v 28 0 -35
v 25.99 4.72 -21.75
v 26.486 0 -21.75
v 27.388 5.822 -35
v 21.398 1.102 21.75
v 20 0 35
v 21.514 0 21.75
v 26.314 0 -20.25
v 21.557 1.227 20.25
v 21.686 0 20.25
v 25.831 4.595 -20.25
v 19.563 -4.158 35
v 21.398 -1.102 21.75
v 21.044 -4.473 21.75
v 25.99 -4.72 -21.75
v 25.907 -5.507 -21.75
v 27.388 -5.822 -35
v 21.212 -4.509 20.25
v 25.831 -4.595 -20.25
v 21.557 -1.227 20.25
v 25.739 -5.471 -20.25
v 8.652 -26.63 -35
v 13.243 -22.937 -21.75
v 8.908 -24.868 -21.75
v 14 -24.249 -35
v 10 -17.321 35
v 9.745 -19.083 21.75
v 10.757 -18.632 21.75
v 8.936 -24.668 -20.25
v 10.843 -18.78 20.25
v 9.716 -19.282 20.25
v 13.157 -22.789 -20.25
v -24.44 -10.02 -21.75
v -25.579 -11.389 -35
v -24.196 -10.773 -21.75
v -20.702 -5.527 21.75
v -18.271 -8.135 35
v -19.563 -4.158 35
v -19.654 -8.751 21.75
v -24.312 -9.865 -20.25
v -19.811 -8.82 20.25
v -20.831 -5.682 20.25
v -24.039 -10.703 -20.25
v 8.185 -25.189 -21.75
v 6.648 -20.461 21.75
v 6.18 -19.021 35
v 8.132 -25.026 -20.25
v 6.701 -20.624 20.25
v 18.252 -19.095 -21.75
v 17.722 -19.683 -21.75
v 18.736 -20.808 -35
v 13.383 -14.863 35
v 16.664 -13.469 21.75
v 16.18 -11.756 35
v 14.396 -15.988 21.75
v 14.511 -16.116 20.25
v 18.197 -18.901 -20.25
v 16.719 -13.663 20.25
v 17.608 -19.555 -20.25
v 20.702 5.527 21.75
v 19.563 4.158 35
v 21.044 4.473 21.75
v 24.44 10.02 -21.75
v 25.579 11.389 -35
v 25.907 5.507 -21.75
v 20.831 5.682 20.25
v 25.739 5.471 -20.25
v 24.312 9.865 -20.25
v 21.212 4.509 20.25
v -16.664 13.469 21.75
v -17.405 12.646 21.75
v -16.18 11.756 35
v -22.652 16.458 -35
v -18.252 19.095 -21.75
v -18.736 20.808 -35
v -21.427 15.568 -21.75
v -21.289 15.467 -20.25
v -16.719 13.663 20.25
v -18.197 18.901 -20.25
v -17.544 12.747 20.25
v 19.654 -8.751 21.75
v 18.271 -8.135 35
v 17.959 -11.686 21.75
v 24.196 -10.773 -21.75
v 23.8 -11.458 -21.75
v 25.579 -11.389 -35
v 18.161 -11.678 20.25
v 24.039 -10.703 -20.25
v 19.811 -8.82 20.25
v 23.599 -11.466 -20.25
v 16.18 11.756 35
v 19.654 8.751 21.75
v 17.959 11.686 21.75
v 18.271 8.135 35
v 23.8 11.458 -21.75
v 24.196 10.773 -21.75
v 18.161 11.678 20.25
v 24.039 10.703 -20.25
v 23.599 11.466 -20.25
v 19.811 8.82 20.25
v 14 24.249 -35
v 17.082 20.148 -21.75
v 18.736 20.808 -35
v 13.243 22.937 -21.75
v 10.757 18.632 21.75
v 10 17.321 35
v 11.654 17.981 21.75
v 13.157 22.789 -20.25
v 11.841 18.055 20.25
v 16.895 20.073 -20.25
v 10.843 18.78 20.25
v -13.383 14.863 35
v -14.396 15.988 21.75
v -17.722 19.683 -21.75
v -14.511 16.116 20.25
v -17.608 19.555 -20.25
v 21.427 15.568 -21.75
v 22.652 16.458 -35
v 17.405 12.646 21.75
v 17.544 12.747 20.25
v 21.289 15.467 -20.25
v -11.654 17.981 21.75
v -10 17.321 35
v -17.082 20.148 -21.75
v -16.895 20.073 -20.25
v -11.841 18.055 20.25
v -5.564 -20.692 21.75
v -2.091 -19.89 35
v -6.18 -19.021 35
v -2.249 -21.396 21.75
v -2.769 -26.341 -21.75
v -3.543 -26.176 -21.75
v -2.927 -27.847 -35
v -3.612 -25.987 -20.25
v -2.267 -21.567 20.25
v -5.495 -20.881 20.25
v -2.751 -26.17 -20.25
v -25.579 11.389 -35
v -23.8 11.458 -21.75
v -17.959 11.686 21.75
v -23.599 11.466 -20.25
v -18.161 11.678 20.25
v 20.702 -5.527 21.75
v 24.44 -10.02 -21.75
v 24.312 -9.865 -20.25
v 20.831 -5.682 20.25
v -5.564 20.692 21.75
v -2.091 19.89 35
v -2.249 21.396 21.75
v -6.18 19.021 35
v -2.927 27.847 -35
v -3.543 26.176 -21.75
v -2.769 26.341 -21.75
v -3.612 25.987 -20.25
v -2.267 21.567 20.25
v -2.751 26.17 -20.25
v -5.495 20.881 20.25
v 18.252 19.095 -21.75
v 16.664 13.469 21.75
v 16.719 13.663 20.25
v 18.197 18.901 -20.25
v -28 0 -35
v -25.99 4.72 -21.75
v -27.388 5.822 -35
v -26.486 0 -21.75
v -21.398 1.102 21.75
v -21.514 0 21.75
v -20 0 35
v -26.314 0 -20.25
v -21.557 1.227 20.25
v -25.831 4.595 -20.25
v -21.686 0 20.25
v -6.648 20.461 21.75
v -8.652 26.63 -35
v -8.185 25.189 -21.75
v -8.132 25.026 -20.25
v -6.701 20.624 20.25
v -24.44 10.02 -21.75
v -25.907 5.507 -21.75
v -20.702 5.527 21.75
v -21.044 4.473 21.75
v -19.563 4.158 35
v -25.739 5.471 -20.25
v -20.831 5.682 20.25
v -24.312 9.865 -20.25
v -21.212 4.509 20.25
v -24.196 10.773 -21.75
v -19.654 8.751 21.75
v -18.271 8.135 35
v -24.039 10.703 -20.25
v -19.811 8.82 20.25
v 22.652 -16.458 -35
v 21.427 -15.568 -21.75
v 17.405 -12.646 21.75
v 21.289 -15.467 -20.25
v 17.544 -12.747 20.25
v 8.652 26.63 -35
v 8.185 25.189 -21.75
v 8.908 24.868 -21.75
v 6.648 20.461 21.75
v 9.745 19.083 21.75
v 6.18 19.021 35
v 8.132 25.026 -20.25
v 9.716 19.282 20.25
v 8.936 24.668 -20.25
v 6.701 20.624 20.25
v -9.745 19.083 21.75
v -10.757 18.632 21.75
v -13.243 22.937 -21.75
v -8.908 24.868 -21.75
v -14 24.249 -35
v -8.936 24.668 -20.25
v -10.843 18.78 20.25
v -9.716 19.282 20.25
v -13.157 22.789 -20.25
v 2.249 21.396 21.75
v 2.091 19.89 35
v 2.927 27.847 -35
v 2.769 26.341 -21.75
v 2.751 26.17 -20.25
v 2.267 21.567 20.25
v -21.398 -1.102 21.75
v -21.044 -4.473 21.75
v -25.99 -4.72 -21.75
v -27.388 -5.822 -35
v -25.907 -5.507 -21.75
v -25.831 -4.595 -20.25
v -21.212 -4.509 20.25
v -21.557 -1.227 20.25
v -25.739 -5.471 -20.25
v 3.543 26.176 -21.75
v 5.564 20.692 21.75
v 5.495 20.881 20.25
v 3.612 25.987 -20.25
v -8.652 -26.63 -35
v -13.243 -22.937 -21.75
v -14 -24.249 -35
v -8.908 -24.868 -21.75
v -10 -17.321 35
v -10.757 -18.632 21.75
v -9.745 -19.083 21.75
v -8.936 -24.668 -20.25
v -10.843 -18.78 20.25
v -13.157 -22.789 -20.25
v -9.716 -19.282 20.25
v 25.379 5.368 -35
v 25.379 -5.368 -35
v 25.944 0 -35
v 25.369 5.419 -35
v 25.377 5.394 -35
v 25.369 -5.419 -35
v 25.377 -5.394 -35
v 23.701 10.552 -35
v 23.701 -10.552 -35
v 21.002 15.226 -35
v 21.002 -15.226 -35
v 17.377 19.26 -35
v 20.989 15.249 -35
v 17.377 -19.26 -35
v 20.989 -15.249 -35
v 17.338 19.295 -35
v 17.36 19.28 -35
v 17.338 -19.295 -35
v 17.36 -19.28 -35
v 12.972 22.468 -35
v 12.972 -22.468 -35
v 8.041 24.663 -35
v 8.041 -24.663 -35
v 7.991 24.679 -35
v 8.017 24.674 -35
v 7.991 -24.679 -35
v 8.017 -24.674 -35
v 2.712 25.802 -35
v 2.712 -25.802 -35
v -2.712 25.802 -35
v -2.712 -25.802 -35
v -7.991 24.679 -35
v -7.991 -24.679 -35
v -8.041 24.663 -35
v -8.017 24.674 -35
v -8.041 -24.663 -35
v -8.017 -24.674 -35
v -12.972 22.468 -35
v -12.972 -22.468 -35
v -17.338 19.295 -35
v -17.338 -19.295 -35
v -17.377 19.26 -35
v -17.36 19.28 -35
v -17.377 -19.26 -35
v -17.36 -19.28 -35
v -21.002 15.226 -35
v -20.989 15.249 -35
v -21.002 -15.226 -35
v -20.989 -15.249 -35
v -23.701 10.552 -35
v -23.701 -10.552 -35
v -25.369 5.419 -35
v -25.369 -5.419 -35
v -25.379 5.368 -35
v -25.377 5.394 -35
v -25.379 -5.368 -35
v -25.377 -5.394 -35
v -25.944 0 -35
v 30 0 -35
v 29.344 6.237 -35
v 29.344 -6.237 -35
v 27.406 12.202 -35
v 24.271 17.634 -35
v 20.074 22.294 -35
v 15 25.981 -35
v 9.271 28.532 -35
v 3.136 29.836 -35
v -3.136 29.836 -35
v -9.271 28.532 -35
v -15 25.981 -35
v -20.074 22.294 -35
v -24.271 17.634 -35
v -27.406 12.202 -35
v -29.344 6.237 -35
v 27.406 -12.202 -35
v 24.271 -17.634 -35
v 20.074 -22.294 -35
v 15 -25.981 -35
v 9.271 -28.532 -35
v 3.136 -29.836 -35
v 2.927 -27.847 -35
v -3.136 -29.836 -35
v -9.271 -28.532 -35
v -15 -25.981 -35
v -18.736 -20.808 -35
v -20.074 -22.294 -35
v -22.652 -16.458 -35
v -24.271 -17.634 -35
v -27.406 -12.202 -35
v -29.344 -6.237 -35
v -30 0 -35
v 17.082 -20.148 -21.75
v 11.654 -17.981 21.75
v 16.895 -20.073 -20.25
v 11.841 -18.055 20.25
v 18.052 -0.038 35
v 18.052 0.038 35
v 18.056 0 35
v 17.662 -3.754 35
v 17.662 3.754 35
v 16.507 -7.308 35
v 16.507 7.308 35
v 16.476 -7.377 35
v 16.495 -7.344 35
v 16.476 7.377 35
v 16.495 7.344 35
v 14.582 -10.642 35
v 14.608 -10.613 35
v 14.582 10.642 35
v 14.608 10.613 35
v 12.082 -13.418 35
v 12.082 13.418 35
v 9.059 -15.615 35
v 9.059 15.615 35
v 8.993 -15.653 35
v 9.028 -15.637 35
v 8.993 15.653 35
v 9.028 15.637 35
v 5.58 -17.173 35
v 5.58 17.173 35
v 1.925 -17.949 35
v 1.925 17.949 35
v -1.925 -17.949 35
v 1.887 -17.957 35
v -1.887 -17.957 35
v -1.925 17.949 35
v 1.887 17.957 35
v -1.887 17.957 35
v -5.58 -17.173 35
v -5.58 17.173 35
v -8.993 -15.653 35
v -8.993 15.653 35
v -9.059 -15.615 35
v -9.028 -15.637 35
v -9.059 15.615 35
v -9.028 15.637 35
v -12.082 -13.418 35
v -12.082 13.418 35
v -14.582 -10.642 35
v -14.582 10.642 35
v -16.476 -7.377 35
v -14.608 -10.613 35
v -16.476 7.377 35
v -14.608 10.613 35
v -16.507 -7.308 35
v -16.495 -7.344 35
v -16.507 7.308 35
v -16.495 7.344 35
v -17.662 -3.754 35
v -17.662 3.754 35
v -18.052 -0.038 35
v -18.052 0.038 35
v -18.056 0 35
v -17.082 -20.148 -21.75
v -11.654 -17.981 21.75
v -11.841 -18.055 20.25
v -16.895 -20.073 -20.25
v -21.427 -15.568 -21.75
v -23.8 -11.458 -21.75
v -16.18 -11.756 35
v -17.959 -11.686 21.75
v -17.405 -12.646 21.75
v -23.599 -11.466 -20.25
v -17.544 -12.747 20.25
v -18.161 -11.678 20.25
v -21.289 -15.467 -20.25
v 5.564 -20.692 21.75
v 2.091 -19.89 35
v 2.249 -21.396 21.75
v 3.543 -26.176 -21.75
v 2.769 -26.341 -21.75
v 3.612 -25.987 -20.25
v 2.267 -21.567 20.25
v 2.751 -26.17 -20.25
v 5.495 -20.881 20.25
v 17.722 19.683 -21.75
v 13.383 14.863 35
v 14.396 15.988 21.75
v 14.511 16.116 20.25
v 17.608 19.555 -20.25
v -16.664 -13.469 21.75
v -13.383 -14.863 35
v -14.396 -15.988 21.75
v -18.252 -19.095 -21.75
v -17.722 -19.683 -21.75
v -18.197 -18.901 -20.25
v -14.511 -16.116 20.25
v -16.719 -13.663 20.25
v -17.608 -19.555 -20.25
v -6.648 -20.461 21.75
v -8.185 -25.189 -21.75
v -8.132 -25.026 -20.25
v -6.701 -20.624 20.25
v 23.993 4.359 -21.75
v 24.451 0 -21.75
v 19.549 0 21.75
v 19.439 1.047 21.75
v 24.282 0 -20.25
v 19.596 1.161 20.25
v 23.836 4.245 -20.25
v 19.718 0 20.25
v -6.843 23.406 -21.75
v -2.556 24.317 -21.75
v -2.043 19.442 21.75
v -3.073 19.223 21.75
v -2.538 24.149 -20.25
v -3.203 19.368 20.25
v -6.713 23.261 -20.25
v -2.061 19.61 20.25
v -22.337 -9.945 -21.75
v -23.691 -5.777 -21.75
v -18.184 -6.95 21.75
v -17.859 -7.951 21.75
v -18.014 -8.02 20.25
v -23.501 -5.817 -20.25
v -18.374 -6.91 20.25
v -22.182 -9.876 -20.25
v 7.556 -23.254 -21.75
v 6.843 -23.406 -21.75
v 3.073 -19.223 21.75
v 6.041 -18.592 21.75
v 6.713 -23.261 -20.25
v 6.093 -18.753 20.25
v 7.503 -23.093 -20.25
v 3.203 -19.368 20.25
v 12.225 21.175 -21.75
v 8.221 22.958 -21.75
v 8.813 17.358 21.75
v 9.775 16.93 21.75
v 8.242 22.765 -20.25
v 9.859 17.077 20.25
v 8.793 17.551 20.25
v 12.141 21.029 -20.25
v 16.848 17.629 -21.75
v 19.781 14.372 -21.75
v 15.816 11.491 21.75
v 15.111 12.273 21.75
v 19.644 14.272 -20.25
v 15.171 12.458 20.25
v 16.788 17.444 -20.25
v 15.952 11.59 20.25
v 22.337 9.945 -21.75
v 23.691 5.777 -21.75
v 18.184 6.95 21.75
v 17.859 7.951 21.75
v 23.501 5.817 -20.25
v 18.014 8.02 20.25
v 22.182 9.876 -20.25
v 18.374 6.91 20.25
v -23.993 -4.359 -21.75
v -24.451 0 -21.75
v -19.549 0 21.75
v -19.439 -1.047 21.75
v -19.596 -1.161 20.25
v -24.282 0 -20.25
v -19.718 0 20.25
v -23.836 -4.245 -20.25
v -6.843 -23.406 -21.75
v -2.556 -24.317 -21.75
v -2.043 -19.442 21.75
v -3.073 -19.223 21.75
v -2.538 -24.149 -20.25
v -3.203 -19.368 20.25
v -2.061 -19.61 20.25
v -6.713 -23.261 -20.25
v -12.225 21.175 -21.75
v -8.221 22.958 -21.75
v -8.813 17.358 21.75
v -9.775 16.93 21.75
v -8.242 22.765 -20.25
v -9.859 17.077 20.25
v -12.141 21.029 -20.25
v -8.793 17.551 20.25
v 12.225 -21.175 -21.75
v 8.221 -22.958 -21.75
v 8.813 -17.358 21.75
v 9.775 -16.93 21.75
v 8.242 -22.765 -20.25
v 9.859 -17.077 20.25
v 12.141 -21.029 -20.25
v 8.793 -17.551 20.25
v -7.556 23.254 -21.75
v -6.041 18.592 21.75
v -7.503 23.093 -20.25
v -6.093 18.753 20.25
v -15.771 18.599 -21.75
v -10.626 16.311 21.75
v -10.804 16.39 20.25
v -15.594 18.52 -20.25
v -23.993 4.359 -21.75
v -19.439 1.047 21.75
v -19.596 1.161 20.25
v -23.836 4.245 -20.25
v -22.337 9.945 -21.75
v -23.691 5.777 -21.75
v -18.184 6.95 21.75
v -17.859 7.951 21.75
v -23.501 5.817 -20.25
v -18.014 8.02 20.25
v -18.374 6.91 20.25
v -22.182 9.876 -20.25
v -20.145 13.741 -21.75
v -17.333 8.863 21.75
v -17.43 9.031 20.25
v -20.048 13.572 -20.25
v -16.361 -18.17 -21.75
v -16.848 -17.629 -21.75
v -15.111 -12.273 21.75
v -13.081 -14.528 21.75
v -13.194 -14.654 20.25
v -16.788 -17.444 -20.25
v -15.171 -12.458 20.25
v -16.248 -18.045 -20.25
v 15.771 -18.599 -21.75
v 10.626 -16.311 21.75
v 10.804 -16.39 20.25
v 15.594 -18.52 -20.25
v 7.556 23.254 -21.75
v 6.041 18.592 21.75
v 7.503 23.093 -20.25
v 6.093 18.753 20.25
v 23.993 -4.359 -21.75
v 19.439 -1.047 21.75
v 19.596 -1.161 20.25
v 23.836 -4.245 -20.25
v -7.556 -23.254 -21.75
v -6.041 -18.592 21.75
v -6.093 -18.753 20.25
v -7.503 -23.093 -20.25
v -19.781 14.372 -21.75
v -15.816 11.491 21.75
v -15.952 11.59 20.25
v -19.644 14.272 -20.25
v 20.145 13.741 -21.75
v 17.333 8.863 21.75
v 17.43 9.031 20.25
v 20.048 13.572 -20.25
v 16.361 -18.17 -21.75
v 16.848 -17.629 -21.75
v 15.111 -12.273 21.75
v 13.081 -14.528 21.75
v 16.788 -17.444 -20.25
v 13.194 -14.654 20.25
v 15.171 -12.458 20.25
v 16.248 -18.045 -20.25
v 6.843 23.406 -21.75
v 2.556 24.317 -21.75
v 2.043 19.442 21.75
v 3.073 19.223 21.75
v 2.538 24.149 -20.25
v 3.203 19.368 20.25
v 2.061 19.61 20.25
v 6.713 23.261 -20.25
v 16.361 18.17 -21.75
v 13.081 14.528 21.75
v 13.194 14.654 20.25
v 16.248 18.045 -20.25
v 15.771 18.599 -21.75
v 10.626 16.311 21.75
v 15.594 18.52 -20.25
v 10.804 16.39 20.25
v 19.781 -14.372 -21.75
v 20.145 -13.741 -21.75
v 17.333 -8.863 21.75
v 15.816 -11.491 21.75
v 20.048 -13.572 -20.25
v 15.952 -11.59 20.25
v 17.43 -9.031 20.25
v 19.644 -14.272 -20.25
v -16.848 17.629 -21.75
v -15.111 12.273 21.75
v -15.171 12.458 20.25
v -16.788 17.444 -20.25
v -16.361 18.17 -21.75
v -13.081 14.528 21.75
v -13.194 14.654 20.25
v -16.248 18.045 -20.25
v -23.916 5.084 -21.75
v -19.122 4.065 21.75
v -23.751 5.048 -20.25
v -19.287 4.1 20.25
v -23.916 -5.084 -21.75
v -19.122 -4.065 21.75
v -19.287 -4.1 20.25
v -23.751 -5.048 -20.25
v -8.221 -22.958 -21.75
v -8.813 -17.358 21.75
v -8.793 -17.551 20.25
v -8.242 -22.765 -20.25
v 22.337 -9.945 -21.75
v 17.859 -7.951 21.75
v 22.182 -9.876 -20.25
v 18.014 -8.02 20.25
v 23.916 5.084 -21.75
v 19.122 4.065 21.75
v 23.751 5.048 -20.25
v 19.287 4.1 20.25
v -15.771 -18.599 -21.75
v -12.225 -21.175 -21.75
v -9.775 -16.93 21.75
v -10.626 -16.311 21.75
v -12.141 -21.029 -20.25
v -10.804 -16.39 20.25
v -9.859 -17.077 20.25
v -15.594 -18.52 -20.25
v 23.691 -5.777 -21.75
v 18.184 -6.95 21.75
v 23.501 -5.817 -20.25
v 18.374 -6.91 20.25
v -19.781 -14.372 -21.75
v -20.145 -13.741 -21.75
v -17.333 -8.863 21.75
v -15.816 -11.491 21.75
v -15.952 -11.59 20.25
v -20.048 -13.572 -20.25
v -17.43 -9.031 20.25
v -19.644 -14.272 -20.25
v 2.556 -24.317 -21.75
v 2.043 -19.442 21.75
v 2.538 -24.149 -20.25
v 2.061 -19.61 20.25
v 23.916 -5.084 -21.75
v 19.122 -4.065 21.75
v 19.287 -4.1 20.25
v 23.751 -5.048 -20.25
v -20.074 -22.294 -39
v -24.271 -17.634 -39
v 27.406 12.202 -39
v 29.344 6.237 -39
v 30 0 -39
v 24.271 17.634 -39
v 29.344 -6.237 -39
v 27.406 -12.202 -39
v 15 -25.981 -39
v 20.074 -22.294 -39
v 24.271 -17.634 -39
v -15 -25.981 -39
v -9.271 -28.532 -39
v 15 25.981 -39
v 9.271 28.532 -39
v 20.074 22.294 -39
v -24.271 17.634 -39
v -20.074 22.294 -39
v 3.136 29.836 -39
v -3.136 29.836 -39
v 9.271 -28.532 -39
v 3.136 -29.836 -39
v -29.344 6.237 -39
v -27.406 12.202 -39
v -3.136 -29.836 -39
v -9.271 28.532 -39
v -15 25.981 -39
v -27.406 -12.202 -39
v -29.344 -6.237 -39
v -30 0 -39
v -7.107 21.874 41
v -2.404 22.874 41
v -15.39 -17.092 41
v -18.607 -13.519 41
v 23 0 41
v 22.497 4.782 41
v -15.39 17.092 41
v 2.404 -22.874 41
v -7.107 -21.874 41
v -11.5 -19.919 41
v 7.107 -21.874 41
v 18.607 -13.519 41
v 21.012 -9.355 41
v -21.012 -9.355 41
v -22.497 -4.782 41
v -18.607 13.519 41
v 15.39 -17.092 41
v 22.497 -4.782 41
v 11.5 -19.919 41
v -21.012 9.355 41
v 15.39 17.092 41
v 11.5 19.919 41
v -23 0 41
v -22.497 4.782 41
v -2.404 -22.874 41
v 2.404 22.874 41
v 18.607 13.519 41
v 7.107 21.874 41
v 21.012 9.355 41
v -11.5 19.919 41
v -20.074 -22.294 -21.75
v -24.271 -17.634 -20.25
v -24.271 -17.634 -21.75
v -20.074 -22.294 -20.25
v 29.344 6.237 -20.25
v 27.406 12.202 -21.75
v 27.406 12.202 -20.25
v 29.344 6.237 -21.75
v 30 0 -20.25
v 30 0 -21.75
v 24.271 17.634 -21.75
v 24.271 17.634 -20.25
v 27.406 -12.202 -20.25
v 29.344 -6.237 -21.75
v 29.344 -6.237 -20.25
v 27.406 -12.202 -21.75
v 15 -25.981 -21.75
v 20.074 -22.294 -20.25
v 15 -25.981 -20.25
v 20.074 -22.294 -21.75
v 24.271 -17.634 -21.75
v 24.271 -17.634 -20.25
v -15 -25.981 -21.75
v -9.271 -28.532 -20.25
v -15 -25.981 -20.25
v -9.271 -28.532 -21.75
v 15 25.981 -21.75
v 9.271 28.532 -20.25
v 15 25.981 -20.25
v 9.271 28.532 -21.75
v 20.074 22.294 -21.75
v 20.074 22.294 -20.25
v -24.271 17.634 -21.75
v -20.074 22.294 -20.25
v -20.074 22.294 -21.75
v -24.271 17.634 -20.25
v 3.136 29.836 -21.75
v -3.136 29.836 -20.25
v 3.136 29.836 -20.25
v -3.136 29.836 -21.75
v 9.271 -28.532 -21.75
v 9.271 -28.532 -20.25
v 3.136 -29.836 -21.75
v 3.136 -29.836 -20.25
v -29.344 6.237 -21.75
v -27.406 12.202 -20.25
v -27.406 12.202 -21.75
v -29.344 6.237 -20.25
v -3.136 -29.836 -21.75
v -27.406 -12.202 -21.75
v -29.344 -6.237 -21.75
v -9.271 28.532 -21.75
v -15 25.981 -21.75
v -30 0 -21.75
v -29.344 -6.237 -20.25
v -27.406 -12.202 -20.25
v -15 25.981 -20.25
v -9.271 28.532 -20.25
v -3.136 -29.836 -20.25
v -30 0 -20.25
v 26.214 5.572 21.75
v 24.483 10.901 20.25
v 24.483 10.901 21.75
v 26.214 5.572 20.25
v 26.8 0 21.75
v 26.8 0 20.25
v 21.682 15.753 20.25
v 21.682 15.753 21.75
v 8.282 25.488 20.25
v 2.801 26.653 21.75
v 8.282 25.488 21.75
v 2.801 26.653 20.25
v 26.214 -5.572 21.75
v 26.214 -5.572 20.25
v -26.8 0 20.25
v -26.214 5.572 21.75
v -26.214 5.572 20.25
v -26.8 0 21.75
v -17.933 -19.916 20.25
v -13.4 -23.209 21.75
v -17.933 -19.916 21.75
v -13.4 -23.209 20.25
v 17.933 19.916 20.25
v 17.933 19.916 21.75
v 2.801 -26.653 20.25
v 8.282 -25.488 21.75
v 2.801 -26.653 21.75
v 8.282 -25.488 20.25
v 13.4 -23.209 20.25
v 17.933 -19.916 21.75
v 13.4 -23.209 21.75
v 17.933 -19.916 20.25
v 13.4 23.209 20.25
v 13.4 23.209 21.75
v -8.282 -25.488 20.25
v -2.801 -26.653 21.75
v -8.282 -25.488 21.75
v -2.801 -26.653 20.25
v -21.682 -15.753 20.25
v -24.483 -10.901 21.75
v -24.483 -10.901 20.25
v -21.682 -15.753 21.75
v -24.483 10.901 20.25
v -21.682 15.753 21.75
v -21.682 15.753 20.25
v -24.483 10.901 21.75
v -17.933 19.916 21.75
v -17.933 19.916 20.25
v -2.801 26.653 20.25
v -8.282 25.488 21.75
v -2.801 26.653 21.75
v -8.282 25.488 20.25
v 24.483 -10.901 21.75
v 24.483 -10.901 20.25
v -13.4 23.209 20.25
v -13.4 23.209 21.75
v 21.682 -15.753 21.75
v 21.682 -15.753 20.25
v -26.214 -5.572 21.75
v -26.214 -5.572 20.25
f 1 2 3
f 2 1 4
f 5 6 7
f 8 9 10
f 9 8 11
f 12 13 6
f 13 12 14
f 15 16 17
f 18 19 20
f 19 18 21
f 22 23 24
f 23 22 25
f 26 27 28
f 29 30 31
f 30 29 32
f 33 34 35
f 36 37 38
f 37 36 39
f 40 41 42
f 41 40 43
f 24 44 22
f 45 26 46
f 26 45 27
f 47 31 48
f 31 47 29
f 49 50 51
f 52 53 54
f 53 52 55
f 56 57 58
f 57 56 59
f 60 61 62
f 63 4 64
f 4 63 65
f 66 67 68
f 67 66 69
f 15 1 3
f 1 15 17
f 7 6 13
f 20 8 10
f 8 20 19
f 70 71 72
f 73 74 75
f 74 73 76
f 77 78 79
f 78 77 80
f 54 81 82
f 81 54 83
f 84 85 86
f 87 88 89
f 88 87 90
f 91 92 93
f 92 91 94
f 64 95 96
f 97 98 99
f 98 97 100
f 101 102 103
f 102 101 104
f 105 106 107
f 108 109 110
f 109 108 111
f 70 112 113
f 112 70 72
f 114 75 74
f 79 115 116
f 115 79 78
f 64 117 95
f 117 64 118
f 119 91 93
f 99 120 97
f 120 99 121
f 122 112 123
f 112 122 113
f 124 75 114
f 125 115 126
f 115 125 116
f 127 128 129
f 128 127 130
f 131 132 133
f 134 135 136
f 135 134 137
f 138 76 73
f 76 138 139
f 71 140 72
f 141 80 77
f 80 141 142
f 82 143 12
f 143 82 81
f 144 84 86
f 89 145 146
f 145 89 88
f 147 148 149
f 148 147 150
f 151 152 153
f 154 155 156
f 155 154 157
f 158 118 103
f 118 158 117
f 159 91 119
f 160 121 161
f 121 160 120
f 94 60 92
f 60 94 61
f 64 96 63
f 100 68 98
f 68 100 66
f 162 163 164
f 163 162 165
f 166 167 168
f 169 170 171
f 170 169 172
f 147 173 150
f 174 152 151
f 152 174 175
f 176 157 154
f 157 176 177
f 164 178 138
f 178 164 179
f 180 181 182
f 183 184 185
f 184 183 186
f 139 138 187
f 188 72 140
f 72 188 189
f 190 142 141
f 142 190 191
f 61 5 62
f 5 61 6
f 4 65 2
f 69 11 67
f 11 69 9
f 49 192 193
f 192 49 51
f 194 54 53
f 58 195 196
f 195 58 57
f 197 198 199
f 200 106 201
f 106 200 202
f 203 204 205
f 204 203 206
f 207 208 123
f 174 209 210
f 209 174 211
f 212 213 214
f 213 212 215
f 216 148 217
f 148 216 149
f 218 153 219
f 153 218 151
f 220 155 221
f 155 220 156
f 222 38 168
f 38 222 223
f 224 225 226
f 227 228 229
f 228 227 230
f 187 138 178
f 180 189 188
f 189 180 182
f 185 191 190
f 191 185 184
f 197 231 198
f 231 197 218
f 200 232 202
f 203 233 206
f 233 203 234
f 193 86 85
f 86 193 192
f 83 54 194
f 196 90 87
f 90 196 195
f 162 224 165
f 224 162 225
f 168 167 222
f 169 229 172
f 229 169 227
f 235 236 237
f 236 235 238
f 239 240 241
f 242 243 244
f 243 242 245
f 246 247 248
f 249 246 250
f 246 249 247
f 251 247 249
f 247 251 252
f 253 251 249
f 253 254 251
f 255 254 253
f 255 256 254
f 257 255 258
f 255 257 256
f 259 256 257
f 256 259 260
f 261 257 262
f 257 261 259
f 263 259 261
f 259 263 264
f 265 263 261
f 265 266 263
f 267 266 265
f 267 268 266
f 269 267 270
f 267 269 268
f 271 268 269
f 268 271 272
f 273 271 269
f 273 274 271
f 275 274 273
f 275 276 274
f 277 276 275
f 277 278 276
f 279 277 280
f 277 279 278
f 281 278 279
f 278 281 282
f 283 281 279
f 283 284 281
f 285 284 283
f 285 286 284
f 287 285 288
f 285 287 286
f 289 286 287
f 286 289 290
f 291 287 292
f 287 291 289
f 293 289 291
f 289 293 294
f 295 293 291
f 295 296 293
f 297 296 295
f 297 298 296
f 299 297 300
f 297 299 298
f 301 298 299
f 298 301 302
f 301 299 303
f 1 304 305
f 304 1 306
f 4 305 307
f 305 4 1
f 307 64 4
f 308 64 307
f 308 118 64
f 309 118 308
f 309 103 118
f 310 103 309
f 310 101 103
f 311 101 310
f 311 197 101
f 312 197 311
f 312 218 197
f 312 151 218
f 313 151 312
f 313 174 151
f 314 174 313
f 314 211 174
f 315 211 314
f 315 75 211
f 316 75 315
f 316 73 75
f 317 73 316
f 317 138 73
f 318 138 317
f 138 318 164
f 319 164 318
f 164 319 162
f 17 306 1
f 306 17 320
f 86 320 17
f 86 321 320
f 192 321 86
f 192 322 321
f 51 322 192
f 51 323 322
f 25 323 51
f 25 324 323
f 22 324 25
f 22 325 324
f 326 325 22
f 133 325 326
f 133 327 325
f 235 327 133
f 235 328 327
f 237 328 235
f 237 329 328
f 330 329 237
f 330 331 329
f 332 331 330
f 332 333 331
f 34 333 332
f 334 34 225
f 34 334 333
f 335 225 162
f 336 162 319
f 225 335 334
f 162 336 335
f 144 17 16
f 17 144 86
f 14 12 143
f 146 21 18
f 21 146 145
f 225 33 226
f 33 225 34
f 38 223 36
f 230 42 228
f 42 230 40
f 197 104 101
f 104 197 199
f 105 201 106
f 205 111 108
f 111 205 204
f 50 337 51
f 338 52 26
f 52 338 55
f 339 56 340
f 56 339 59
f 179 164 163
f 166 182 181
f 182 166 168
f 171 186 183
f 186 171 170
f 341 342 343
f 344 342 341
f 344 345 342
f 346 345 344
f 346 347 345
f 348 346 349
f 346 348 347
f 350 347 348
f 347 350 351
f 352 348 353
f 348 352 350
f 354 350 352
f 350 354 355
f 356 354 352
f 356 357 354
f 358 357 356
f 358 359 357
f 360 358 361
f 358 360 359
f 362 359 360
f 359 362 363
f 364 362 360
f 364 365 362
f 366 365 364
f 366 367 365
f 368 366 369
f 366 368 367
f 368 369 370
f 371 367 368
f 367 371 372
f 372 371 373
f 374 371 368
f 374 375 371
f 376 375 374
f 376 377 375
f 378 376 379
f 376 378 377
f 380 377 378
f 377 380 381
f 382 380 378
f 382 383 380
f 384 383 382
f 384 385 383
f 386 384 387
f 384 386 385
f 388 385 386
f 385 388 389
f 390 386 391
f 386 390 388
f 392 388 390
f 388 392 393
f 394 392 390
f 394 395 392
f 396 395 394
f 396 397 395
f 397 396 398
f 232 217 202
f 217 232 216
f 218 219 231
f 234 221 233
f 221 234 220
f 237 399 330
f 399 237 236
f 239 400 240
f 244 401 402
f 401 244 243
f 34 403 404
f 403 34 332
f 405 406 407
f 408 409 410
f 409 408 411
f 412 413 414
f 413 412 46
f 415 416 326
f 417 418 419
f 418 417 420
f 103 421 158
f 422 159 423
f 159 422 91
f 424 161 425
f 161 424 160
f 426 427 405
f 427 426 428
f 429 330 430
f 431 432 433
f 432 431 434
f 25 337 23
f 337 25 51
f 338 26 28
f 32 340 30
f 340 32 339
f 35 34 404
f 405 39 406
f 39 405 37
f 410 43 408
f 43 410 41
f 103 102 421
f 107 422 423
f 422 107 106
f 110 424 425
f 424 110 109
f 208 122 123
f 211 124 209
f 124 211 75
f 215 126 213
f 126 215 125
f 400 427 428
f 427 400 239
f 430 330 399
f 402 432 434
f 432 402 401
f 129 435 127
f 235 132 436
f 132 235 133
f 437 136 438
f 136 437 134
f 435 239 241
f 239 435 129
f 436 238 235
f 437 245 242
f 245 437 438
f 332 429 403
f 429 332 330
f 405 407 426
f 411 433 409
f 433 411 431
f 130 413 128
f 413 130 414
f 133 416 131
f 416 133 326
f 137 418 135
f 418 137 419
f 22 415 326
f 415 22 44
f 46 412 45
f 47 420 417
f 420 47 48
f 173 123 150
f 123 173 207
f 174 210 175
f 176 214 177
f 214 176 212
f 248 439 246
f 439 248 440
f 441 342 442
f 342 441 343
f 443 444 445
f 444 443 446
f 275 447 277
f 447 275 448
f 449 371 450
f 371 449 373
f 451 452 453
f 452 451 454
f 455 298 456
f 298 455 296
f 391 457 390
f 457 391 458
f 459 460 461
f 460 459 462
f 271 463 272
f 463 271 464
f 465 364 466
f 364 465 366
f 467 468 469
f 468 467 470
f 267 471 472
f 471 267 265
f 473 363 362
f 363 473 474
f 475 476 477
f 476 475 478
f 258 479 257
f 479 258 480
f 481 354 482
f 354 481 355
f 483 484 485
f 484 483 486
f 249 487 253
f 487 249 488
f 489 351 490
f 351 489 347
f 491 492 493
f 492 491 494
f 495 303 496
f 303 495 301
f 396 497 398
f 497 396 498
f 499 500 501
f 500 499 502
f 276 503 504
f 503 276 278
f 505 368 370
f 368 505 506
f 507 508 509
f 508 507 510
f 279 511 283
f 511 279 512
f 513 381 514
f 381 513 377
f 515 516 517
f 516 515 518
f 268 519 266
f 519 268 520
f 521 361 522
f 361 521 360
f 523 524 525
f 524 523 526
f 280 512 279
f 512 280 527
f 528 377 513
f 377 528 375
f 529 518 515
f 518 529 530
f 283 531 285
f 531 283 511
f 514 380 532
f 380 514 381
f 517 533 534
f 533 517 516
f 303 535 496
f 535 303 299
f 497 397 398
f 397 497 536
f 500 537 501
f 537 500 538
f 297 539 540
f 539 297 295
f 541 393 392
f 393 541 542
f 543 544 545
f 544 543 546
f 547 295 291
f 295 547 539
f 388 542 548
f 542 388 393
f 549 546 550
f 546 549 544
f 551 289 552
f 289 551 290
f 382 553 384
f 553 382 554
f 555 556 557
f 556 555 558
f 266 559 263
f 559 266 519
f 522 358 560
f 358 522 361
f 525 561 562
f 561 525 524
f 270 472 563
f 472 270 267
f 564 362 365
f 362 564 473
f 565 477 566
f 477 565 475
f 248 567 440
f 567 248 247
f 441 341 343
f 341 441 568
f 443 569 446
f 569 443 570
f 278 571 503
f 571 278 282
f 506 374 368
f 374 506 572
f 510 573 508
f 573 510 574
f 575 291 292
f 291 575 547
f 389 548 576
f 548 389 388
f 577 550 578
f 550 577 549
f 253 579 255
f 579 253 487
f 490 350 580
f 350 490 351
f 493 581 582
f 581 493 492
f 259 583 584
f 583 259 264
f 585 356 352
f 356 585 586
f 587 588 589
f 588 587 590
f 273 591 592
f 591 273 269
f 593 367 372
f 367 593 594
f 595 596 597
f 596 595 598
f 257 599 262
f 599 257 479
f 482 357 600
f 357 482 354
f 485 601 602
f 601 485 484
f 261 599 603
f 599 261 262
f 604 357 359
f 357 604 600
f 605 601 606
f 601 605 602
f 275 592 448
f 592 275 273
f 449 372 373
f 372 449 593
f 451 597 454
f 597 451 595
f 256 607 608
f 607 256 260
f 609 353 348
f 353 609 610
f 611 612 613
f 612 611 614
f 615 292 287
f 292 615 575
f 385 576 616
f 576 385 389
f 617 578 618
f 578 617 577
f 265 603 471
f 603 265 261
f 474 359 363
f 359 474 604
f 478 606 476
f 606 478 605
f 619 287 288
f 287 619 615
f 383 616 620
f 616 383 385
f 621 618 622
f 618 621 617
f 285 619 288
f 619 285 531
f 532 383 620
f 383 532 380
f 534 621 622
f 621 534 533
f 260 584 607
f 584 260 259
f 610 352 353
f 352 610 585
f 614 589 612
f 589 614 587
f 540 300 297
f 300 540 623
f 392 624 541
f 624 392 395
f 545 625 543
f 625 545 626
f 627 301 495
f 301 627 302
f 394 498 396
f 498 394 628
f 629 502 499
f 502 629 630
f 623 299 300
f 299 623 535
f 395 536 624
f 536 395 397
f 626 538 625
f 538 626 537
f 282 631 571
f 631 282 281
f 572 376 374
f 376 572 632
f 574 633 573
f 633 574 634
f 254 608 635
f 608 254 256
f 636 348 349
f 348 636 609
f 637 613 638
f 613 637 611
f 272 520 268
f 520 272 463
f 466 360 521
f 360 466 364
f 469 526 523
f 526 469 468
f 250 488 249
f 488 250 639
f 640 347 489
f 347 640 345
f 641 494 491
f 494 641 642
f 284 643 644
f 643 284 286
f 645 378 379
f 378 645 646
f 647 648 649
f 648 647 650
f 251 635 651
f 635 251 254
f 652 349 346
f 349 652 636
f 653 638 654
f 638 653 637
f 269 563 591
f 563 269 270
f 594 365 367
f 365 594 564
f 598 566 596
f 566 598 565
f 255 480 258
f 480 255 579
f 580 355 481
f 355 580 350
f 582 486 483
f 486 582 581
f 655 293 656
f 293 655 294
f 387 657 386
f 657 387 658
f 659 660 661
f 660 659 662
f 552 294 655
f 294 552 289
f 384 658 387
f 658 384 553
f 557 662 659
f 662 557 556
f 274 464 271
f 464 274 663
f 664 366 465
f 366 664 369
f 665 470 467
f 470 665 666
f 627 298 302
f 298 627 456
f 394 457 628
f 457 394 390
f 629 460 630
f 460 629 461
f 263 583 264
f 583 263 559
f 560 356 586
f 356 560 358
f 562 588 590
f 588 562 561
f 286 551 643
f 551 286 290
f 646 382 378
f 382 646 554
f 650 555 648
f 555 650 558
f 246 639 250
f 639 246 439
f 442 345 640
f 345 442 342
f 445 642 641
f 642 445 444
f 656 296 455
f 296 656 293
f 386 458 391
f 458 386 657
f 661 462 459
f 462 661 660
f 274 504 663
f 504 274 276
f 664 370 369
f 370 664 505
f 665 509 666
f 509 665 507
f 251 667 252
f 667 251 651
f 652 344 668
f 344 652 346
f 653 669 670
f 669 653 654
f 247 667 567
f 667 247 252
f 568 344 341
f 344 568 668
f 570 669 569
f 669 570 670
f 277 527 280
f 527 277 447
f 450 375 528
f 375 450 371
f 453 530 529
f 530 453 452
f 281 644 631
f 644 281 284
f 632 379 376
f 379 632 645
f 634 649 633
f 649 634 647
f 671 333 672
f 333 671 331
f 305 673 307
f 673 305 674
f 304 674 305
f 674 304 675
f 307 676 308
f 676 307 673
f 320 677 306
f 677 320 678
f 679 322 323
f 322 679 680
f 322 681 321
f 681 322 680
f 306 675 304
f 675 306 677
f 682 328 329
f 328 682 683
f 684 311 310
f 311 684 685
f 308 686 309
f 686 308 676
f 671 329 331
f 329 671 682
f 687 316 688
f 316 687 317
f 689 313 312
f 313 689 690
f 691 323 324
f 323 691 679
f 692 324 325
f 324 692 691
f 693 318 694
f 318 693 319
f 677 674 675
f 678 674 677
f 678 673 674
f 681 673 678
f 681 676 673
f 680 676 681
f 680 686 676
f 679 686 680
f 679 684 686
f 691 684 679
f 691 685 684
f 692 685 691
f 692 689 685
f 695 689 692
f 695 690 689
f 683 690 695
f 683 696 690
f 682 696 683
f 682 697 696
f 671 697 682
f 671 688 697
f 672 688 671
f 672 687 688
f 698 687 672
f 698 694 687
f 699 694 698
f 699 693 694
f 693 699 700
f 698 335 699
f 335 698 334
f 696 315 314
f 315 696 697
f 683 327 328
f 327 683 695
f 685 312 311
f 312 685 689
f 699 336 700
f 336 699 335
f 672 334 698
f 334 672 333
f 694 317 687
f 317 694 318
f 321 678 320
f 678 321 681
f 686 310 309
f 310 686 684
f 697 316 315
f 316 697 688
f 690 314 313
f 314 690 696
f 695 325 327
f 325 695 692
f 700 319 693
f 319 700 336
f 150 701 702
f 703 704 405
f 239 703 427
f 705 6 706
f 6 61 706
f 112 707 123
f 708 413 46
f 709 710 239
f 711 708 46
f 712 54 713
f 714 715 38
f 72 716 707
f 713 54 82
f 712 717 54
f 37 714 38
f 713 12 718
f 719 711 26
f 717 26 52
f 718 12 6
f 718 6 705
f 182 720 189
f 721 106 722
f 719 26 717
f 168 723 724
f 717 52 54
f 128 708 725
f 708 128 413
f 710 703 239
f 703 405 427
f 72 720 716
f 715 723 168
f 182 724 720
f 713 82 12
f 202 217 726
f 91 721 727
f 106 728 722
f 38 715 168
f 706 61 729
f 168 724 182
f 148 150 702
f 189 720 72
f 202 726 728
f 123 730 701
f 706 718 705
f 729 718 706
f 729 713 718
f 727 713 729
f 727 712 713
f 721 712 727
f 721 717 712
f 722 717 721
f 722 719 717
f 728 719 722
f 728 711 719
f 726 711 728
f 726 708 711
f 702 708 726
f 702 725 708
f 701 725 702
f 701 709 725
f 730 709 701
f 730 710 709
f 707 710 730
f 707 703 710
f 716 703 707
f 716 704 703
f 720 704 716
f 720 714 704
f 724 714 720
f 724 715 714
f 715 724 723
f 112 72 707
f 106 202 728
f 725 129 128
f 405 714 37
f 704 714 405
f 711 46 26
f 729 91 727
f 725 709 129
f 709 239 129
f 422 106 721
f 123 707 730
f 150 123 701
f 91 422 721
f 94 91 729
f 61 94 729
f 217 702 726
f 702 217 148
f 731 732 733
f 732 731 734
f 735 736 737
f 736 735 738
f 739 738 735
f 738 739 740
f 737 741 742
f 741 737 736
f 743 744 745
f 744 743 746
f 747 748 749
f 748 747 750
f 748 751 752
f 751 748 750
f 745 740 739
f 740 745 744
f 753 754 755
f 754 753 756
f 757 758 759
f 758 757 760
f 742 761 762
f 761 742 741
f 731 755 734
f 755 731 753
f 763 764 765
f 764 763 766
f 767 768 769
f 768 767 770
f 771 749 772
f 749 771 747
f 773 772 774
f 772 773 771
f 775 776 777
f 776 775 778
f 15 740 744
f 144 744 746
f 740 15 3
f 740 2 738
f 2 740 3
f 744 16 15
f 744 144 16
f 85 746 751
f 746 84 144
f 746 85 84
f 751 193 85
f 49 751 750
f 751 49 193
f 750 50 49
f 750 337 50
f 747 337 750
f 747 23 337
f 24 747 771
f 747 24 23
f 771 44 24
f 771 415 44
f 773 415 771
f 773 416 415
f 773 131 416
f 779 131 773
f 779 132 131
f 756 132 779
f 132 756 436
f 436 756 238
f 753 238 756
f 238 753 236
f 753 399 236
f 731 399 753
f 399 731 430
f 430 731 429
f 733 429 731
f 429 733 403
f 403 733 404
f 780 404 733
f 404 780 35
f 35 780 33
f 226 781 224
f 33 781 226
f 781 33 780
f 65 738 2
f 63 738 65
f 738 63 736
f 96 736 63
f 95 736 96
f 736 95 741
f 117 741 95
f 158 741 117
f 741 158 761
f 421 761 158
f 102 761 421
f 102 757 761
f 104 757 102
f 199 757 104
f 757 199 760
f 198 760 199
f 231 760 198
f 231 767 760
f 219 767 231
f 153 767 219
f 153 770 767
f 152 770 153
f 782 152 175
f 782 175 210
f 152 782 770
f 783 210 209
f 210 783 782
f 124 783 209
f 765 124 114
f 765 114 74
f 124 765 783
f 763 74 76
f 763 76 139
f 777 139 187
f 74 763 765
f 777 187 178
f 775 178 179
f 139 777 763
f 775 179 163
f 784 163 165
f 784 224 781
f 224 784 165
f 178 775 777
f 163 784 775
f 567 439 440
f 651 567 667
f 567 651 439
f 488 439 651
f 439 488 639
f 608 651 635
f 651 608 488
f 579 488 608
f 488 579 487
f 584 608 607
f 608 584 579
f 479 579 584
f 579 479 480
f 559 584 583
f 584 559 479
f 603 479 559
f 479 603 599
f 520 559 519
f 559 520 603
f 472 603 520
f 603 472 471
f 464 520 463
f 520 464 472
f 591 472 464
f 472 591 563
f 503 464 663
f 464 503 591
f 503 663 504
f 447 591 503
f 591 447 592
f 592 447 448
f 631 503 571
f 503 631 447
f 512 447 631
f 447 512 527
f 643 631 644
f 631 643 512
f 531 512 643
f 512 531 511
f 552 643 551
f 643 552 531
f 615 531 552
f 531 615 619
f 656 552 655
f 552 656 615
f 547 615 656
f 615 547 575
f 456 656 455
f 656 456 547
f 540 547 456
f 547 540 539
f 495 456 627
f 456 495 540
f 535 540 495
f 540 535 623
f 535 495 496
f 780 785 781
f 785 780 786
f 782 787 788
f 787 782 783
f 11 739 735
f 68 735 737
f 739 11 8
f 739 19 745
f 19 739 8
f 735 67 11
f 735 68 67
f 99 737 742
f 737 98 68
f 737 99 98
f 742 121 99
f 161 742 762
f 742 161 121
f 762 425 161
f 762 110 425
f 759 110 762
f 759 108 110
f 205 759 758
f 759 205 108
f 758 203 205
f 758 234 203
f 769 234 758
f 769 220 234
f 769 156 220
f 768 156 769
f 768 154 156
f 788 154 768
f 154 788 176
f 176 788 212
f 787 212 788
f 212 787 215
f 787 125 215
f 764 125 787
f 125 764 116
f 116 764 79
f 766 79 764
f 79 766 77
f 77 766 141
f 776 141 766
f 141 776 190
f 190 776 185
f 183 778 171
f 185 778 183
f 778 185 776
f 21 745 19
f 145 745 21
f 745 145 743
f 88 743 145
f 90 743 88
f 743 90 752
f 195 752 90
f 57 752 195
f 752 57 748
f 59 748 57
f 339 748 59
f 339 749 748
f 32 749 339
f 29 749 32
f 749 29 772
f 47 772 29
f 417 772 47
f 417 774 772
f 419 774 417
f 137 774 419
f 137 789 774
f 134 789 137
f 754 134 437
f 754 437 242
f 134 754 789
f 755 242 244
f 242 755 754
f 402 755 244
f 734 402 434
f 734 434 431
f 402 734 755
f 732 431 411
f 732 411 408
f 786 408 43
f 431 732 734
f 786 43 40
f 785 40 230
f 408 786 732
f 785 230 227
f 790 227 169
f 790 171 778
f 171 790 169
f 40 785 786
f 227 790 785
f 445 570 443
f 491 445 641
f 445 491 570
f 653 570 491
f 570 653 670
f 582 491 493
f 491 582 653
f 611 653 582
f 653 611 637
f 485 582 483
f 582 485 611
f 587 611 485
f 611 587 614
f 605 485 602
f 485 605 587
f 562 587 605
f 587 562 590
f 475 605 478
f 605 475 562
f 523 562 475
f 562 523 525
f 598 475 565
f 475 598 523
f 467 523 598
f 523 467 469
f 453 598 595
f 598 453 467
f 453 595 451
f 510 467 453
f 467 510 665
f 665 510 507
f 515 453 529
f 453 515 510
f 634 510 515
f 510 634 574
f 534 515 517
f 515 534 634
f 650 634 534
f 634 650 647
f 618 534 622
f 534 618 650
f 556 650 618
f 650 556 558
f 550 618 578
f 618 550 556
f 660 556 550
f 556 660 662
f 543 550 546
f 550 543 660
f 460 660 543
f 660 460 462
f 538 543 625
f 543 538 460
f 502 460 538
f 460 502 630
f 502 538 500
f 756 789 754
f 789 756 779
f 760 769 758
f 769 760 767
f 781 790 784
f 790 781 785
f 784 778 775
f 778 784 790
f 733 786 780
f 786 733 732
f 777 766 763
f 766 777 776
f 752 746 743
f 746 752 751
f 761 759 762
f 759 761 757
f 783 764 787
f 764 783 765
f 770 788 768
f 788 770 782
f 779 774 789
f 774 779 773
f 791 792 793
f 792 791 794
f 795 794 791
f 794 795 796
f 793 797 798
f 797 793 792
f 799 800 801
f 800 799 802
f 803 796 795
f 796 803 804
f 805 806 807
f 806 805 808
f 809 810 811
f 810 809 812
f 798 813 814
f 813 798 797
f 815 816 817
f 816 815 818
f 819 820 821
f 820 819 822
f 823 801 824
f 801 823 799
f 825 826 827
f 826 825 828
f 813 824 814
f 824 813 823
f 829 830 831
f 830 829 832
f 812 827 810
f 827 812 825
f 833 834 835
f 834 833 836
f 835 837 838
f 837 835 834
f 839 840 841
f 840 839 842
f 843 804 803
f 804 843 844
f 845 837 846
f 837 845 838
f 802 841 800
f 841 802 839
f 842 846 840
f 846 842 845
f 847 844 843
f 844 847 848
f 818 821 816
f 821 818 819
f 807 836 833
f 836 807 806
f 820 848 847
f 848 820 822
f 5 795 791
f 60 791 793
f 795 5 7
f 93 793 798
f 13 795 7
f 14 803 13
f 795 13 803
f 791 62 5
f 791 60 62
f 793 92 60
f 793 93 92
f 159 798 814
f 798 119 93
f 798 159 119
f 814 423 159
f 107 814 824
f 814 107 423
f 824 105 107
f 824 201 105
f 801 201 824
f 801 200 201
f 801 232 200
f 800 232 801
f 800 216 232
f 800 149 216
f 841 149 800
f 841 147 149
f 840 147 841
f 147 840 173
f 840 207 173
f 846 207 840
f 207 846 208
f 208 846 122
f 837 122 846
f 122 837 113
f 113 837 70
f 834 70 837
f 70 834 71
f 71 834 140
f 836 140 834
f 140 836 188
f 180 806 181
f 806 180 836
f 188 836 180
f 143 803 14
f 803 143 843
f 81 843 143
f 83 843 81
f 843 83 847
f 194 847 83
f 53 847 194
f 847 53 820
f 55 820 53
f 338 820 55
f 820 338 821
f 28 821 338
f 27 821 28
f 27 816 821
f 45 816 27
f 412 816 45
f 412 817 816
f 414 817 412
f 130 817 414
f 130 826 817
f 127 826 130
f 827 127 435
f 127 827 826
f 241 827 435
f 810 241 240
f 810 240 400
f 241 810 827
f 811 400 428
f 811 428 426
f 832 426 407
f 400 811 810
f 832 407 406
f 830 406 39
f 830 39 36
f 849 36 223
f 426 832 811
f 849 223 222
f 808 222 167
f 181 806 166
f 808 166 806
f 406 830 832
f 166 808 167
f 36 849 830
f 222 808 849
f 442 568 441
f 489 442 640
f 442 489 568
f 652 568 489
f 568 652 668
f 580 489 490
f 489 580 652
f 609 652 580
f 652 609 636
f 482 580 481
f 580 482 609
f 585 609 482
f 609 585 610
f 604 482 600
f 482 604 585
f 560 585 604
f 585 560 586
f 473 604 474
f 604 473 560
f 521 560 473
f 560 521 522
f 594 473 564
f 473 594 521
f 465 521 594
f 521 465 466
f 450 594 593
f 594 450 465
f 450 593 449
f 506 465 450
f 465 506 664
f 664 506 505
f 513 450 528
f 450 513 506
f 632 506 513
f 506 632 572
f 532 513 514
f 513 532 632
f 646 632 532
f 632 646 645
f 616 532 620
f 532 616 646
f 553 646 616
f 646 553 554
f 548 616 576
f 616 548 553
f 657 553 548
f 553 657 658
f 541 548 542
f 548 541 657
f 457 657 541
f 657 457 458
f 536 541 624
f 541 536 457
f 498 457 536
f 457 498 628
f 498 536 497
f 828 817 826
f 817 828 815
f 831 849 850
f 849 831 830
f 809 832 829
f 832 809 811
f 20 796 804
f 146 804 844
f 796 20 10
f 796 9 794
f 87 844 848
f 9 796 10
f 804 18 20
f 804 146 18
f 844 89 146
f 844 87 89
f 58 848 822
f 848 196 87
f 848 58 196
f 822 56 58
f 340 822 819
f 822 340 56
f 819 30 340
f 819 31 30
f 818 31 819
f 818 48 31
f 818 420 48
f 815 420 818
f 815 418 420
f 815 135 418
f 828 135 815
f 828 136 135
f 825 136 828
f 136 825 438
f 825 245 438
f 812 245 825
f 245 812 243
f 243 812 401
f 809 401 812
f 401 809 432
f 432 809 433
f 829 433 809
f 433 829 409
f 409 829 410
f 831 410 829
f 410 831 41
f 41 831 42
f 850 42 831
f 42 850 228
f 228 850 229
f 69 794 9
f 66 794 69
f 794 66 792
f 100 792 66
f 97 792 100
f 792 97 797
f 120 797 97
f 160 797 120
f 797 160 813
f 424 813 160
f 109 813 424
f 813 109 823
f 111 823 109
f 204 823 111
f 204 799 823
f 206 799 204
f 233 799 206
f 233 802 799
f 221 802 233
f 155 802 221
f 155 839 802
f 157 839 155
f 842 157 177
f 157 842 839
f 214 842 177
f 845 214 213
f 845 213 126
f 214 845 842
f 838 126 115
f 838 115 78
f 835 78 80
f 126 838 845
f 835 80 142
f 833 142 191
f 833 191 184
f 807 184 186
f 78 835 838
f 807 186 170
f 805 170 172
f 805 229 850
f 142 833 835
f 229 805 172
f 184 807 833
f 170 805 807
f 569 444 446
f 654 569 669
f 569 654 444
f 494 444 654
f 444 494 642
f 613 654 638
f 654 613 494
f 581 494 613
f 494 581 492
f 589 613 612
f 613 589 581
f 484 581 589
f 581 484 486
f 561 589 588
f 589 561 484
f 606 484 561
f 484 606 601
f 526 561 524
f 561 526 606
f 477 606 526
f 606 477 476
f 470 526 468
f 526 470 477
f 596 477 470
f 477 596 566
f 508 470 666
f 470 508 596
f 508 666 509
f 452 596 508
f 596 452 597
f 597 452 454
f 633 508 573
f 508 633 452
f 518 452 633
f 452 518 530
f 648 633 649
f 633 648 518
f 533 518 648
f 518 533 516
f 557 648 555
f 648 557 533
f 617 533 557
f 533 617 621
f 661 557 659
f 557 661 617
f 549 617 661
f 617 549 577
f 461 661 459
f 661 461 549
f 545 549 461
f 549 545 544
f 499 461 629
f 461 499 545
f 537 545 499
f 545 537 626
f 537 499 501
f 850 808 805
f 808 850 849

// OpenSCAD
// 3DScad sample: parametric decorative vase
// Features: boolean operations, tapered form, flared rim, ornamental rings

module scene_model() {
    body_h = 70;
    body_r = 28;
    rim_r = 20;
    base_h = 4;
    base_r = 30;
    neck_h = 6;
    wall = 2;

    union() {
        // Base disc (below body)
        translate([0, 0, -body_h / 2 - base_h / 2]) {
            cylinder(h=base_h, r=base_r, center=true);
        }

        // Hollow tapered body (centered at origin)
        difference() {
            cylinder(h=body_h, r1=body_r, r2=rim_r, center=true);
            cylinder(h=body_h + 1, r1=body_r - wall, r2=rim_r - wall, center=true);
        }

        // Neck ring (above body)
        translate([0, 0, body_h / 2 + neck_h / 2]) {
            cylinder(h=neck_h, r1=rim_r, r2=rim_r + 3, center=true);
        }

        // Lower ornamental ring
        translate([0, 0, -body_h * 0.3]) {
            cylinder(h=1.5, r=body_r + 2, center=true);
        }

        // Upper ornamental ring
        translate([0, 0, body_h * 0.3]) {
            cylinder(h=1.5, r=body_r + (rim_r - body_r) * 0.4 + 2, center=true);
        }
    }
}

scene_model();
